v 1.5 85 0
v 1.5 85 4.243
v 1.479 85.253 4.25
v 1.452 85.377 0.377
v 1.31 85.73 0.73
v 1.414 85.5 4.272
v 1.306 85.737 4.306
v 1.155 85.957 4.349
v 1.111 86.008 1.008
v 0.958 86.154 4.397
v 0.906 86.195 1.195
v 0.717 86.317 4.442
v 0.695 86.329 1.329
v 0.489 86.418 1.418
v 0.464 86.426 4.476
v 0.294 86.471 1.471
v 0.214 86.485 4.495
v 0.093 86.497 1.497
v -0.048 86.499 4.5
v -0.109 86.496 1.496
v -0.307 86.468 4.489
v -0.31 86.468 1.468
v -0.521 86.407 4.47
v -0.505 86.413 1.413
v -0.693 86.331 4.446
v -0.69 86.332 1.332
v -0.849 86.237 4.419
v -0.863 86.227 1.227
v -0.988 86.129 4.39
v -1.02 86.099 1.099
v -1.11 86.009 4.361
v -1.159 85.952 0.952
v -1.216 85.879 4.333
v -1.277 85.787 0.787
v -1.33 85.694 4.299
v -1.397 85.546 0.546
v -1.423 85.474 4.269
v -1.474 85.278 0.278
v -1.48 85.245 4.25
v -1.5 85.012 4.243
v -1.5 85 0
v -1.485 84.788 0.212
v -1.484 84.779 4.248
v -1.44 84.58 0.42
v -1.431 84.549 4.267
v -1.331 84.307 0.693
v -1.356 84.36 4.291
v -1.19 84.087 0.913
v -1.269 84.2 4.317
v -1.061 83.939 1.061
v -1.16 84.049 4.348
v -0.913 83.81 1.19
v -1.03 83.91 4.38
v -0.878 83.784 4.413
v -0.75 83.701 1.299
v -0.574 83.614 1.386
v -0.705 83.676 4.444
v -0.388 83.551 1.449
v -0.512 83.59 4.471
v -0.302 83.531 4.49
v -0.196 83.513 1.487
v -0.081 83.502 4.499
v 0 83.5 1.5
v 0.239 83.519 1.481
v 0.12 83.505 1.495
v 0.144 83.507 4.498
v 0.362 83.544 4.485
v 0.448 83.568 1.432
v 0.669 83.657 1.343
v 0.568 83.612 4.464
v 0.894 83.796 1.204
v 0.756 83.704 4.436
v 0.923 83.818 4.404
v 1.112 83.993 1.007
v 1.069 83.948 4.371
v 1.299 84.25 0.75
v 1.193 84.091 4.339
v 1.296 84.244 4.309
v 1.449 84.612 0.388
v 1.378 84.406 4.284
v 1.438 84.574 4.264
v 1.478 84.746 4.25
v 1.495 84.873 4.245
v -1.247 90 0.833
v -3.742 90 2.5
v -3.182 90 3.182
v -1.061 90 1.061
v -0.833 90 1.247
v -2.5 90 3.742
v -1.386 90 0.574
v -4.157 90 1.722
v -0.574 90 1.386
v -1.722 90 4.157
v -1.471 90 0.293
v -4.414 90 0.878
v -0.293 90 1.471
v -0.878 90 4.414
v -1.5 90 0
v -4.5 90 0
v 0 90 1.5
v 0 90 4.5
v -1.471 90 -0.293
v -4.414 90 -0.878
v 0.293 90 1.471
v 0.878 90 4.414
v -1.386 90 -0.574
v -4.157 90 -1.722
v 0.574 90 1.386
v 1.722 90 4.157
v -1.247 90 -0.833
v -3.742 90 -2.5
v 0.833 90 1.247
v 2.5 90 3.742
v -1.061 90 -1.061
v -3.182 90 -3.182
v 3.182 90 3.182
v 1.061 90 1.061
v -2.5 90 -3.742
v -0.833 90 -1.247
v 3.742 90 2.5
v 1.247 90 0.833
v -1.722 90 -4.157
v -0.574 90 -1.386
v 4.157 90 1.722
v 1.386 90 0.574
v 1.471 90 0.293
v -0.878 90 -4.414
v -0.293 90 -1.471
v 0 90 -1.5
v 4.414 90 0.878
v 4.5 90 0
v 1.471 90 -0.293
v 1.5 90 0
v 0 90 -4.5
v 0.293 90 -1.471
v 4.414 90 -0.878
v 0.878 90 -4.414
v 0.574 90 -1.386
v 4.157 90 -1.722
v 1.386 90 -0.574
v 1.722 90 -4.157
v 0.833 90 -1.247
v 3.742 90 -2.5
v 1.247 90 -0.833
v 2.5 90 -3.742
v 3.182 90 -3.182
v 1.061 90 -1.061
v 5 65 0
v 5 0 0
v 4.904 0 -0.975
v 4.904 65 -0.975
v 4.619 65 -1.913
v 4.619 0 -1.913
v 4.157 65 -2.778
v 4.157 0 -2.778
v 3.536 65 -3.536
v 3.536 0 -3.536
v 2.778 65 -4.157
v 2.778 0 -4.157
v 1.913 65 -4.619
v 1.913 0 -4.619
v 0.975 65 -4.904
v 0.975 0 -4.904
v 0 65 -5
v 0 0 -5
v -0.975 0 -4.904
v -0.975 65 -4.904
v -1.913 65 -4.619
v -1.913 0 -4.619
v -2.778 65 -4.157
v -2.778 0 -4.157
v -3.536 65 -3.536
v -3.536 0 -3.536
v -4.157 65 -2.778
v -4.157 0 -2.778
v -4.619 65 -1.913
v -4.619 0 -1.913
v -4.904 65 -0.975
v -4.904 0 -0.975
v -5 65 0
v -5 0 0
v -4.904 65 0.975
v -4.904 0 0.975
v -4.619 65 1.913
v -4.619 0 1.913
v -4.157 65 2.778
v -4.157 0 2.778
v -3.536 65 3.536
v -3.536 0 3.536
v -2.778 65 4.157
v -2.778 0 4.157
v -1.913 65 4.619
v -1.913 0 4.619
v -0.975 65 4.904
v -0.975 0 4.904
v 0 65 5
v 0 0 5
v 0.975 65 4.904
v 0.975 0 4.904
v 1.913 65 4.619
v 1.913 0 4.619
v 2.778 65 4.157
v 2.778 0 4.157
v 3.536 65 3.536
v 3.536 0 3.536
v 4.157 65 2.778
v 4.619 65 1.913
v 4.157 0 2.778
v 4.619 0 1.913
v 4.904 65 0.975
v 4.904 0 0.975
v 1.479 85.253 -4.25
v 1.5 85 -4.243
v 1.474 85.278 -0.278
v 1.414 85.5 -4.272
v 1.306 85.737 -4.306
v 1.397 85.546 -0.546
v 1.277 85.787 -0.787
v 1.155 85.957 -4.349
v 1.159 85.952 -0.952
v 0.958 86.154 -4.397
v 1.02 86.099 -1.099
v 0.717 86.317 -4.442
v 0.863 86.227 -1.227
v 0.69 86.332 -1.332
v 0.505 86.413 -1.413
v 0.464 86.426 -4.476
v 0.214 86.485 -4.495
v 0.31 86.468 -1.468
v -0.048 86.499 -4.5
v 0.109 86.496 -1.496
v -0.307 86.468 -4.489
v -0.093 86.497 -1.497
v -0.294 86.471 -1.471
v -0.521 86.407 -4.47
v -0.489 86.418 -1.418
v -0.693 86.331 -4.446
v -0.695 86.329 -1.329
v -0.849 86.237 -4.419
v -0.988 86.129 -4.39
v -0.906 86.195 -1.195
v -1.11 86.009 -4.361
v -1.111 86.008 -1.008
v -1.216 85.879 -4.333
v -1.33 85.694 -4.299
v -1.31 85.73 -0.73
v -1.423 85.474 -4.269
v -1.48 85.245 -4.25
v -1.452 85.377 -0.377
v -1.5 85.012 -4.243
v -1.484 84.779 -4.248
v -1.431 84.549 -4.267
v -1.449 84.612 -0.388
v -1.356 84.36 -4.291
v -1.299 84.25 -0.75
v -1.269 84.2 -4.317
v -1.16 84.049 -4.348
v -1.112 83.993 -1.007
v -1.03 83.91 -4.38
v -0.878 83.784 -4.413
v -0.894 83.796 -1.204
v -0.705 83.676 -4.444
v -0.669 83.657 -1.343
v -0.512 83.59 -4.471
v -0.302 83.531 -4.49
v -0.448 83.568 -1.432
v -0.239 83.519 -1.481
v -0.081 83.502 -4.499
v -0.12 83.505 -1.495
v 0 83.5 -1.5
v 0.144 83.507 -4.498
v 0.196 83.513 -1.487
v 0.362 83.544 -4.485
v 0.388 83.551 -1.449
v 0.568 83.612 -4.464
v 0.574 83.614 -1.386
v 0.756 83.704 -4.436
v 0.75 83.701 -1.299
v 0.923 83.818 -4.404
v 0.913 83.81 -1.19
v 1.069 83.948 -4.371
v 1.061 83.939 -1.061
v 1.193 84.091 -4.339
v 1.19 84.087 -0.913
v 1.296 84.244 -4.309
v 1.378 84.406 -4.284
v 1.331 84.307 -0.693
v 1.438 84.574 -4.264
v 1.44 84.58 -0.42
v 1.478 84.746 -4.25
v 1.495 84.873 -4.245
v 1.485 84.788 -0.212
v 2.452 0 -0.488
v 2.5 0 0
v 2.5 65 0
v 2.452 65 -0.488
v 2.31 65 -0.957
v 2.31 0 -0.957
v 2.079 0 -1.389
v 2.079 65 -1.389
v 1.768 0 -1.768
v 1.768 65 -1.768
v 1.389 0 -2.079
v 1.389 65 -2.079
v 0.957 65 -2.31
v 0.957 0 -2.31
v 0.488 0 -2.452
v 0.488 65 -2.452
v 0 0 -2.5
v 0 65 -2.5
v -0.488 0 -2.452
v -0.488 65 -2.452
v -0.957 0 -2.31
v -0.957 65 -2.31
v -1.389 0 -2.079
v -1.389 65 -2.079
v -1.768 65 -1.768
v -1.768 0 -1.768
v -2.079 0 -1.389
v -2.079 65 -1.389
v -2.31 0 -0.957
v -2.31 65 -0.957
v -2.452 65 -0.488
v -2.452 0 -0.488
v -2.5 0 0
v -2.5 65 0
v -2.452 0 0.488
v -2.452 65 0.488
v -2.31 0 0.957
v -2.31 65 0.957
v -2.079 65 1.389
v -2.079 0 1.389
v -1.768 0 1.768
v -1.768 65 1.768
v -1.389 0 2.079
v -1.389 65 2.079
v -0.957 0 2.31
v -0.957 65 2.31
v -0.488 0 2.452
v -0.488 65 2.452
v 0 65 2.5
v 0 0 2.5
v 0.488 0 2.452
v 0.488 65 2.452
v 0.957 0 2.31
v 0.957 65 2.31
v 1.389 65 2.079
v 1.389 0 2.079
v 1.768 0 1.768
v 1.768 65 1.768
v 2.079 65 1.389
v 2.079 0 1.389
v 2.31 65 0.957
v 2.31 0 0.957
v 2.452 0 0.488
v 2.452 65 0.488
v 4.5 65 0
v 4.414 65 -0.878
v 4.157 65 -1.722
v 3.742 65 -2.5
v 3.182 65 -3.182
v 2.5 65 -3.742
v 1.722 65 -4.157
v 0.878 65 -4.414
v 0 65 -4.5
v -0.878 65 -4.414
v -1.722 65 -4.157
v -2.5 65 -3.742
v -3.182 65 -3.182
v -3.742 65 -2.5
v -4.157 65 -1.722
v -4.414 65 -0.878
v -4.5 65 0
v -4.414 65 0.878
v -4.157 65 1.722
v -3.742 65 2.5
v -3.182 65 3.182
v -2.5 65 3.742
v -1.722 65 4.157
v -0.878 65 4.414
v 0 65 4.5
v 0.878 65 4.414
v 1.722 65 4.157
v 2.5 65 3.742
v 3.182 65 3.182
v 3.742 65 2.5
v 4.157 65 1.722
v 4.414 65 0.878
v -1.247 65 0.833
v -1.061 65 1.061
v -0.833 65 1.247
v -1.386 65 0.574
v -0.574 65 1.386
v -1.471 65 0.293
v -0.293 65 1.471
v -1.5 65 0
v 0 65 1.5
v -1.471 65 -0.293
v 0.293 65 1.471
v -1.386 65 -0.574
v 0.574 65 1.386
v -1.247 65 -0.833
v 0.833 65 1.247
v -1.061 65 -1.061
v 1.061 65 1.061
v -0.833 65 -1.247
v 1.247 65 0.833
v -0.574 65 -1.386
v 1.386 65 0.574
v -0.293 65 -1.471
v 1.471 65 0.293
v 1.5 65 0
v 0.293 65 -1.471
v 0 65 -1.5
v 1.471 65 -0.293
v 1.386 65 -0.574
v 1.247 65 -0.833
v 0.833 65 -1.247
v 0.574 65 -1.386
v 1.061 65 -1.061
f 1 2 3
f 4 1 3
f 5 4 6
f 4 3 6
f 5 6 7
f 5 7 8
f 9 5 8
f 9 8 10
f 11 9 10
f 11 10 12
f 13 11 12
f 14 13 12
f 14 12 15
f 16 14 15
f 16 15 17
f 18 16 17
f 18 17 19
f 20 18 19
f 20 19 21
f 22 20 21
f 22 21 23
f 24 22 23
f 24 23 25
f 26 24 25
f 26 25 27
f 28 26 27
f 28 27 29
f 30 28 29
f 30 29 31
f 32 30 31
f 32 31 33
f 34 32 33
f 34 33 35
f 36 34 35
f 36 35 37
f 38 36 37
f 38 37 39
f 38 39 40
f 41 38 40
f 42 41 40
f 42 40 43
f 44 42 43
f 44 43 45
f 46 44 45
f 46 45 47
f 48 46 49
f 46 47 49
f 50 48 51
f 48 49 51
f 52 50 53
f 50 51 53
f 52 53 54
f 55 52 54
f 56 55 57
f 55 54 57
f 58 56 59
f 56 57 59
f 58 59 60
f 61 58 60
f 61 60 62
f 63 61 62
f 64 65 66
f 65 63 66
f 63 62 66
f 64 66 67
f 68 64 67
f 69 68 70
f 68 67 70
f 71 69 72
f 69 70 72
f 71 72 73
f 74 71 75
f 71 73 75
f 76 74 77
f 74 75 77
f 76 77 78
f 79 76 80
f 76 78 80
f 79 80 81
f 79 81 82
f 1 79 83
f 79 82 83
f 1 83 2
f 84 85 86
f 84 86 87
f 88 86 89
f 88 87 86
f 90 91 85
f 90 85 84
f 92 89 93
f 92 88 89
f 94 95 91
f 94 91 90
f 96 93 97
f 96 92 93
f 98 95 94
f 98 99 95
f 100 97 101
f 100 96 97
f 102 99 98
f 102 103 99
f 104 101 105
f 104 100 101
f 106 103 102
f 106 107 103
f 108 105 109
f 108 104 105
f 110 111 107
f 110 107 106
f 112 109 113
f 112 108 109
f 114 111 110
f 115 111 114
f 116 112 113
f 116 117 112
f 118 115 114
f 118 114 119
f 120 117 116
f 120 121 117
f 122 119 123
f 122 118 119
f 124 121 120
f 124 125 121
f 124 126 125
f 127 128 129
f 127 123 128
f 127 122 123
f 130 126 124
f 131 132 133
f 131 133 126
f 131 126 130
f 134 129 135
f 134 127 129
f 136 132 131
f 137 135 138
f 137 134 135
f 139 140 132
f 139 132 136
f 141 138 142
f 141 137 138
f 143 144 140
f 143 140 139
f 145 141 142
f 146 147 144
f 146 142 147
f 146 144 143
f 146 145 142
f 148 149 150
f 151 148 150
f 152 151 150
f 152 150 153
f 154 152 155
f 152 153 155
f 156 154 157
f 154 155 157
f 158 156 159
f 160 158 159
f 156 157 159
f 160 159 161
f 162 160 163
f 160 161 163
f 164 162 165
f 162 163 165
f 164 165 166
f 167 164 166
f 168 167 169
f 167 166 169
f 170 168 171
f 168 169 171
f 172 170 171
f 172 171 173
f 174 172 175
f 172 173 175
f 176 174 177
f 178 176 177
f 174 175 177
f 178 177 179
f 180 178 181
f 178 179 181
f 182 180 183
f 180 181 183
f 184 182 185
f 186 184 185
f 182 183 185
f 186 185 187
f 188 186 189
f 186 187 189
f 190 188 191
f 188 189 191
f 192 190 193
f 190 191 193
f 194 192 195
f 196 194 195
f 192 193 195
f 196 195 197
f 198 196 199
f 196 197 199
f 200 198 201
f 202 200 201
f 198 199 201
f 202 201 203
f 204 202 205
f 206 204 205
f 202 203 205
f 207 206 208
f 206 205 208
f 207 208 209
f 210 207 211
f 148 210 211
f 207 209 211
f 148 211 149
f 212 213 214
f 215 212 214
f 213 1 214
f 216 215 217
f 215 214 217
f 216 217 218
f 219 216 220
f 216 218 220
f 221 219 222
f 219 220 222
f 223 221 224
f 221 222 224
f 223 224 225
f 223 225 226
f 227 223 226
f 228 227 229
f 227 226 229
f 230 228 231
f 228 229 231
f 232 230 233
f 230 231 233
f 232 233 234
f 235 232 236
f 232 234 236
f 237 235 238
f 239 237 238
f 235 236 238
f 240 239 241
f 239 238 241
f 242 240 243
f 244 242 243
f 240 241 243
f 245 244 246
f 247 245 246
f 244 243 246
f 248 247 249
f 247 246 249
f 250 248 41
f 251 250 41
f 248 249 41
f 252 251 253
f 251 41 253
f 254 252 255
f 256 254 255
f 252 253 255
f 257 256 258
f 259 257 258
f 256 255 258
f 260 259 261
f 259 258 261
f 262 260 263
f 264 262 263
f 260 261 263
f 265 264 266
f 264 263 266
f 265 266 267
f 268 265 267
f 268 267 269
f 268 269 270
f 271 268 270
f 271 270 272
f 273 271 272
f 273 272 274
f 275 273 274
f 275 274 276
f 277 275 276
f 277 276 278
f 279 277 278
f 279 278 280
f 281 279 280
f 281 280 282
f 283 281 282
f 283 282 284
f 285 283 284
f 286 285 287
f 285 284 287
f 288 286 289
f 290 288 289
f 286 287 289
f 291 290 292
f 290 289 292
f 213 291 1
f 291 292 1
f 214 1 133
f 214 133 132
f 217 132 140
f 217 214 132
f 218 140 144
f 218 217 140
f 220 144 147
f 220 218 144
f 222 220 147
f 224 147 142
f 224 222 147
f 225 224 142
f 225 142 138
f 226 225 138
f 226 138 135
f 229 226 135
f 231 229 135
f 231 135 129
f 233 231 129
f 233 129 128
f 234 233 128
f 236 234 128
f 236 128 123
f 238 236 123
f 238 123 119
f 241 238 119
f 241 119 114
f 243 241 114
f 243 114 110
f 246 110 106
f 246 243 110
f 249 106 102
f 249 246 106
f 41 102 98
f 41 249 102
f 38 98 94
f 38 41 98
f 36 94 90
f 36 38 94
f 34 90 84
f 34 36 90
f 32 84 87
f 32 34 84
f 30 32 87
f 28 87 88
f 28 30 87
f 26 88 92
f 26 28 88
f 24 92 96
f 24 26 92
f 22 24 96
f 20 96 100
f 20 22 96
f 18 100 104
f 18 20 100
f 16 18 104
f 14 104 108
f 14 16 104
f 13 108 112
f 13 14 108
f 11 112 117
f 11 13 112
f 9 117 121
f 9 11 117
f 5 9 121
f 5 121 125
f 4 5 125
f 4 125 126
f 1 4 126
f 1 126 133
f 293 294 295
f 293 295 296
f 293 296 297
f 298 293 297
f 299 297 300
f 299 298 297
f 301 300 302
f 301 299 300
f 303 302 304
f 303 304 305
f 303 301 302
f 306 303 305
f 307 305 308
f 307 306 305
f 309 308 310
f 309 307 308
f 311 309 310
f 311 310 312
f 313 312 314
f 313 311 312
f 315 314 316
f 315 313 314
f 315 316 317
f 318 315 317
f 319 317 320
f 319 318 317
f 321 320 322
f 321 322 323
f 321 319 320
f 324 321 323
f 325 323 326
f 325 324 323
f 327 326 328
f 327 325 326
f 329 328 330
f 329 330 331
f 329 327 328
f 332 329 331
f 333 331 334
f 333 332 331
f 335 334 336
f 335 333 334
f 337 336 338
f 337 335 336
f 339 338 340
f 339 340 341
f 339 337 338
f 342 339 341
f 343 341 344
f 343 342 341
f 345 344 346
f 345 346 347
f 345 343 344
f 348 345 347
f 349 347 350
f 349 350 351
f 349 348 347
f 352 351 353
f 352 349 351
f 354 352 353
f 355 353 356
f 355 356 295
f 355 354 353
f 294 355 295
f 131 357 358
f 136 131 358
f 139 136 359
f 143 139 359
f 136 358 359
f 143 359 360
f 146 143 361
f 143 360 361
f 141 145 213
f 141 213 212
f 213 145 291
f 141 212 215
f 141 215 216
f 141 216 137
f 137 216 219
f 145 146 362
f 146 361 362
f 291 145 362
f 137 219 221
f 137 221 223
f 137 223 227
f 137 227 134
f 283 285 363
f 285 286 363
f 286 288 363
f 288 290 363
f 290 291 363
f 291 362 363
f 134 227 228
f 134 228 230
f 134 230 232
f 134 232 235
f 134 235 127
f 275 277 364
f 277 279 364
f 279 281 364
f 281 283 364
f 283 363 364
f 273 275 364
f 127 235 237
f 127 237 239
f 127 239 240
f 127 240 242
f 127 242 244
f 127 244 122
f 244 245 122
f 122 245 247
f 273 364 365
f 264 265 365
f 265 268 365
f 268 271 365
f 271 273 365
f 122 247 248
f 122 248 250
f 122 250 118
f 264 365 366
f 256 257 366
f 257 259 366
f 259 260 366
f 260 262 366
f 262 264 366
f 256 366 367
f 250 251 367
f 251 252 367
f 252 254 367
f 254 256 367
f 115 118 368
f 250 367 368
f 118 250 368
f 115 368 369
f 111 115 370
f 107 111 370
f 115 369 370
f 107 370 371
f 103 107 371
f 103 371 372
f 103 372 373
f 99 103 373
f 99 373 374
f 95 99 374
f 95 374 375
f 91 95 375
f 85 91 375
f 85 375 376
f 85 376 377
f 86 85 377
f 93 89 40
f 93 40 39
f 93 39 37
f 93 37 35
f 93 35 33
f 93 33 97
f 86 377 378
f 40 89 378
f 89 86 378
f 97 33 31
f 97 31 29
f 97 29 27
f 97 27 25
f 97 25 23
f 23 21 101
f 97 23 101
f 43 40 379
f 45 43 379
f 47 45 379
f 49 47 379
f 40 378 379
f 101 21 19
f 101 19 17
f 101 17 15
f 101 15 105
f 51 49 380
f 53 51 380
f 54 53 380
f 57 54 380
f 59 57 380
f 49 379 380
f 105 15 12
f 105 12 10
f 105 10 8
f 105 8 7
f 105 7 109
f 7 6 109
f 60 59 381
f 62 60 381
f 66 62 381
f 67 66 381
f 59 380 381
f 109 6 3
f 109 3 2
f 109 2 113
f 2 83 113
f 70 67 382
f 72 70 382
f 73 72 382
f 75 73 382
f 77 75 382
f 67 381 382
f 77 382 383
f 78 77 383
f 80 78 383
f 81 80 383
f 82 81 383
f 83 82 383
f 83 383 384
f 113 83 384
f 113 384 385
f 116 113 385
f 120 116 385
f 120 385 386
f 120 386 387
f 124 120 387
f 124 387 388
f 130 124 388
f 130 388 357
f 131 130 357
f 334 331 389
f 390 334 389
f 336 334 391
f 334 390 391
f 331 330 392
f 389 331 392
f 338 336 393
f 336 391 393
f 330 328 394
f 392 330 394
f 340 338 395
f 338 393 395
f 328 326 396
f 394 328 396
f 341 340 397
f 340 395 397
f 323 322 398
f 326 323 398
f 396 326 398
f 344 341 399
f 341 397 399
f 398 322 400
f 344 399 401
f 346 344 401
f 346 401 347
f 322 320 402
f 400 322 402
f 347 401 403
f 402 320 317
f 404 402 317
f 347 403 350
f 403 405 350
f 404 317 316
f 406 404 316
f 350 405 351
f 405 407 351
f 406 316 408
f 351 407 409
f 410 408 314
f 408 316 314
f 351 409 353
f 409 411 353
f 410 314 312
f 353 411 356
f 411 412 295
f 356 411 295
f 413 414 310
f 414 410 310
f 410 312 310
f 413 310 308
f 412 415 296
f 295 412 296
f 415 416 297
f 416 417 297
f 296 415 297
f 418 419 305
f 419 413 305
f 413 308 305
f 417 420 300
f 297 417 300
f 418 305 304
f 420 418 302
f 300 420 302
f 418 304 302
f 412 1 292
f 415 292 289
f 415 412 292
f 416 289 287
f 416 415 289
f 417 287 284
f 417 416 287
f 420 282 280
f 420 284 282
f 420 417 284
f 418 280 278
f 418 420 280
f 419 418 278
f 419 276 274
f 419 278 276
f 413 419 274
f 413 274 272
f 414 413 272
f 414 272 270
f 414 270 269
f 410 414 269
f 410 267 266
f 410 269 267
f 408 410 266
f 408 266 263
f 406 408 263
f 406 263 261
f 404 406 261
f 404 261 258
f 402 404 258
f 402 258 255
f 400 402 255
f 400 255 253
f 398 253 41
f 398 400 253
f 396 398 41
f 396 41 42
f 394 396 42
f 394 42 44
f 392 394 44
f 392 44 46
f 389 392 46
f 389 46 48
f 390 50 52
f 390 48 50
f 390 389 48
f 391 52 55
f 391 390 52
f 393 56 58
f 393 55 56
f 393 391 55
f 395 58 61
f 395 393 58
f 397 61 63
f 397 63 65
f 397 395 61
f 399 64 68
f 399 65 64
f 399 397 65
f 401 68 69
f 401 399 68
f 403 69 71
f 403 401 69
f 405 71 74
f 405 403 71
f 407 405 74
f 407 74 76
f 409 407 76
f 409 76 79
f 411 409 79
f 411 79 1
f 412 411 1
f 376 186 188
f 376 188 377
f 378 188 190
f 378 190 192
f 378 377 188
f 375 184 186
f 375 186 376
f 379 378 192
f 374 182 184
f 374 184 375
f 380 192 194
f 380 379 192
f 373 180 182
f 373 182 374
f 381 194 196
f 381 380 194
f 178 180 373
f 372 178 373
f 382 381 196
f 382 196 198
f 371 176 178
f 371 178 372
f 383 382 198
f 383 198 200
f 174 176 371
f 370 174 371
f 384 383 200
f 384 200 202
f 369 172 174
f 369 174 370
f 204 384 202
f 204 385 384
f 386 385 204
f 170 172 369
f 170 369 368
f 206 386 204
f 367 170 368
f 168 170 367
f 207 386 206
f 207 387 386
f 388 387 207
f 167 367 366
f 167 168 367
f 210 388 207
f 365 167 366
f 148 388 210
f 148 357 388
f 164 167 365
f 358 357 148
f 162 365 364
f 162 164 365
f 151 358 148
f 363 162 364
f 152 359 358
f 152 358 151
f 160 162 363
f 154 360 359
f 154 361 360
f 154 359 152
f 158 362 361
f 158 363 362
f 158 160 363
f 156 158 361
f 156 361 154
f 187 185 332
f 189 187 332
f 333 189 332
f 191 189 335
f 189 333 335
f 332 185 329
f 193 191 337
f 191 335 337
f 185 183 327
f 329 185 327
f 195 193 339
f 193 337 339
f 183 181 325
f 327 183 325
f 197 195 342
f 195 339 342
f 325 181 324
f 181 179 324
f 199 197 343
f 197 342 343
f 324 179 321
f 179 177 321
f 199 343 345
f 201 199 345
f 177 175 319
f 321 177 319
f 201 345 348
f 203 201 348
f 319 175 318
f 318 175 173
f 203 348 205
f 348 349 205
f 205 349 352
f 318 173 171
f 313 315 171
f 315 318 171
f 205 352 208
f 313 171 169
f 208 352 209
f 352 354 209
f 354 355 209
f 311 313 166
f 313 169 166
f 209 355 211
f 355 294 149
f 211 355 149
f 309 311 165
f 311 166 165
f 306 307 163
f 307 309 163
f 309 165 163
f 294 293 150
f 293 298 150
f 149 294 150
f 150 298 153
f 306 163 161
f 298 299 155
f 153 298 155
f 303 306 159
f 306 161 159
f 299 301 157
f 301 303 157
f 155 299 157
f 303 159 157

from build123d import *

# Parameters (mm, degrees)
SKETCH1_R           = 5
SKETCH1_R_2         = 2.5
BOSS_EXTRUDE1_DEPTH = 65
SKETCH2_R           = 4.5
SKETCH2_R_2         = 1.5
BOSS_EXTRUDE2_DEPTH = 25
SKETCH4_R           = 1.5
CUT_EXTRUDE1_DEPTH  = 32.5


with BuildPart() as part:
    # Sketch1 → Boss-Extrude1 (new body)
    with BuildSketch(Plane(origin=(0, 0, 0), x_dir=(1, 0, 0), z_dir=(0, 1, 0))):
        Circle(SKETCH1_R)
        Circle(SKETCH1_R_2, mode=Mode.SUBTRACT)
    extrude(amount=BOSS_EXTRUDE1_DEPTH)

    # Sketch2 → Boss-Extrude2 (add)
    with BuildSketch(Plane(origin=(0, 65, 0), x_dir=(1, 0, 0), z_dir=(0, 1, 0))):
        Circle(SKETCH2_R)
        Circle(SKETCH2_R_2, mode=Mode.SUBTRACT)
    extrude(amount=BOSS_EXTRUDE2_DEPTH)

    # Sketch4 → Cut-Extrude1 (cut, symmetric)
    with BuildSketch(Plane.XY):
        with Locations((0, 85)):
            Circle(SKETCH4_R)
    extrude(amount=CUT_EXTRUDE1_DEPTH, both=True, mode=Mode.SUBTRACT)


solid = part.part
